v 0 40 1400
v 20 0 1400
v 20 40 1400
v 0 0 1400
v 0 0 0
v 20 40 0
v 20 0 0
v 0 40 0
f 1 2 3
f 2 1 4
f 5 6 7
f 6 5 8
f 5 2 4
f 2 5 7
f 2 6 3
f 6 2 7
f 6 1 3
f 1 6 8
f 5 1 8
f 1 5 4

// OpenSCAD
// Upright component.
// Open this file directly in OpenSCAD to tune and render the part.

/* [Dimensions] */
upright_width = 20;
upright_depth = 40;
upright_height = 1400;

module upright(width, depth, height) {
    cube([width, depth, height]);
}

// Standalone component preview/render.
upright(upright_width, upright_depth, upright_height);
